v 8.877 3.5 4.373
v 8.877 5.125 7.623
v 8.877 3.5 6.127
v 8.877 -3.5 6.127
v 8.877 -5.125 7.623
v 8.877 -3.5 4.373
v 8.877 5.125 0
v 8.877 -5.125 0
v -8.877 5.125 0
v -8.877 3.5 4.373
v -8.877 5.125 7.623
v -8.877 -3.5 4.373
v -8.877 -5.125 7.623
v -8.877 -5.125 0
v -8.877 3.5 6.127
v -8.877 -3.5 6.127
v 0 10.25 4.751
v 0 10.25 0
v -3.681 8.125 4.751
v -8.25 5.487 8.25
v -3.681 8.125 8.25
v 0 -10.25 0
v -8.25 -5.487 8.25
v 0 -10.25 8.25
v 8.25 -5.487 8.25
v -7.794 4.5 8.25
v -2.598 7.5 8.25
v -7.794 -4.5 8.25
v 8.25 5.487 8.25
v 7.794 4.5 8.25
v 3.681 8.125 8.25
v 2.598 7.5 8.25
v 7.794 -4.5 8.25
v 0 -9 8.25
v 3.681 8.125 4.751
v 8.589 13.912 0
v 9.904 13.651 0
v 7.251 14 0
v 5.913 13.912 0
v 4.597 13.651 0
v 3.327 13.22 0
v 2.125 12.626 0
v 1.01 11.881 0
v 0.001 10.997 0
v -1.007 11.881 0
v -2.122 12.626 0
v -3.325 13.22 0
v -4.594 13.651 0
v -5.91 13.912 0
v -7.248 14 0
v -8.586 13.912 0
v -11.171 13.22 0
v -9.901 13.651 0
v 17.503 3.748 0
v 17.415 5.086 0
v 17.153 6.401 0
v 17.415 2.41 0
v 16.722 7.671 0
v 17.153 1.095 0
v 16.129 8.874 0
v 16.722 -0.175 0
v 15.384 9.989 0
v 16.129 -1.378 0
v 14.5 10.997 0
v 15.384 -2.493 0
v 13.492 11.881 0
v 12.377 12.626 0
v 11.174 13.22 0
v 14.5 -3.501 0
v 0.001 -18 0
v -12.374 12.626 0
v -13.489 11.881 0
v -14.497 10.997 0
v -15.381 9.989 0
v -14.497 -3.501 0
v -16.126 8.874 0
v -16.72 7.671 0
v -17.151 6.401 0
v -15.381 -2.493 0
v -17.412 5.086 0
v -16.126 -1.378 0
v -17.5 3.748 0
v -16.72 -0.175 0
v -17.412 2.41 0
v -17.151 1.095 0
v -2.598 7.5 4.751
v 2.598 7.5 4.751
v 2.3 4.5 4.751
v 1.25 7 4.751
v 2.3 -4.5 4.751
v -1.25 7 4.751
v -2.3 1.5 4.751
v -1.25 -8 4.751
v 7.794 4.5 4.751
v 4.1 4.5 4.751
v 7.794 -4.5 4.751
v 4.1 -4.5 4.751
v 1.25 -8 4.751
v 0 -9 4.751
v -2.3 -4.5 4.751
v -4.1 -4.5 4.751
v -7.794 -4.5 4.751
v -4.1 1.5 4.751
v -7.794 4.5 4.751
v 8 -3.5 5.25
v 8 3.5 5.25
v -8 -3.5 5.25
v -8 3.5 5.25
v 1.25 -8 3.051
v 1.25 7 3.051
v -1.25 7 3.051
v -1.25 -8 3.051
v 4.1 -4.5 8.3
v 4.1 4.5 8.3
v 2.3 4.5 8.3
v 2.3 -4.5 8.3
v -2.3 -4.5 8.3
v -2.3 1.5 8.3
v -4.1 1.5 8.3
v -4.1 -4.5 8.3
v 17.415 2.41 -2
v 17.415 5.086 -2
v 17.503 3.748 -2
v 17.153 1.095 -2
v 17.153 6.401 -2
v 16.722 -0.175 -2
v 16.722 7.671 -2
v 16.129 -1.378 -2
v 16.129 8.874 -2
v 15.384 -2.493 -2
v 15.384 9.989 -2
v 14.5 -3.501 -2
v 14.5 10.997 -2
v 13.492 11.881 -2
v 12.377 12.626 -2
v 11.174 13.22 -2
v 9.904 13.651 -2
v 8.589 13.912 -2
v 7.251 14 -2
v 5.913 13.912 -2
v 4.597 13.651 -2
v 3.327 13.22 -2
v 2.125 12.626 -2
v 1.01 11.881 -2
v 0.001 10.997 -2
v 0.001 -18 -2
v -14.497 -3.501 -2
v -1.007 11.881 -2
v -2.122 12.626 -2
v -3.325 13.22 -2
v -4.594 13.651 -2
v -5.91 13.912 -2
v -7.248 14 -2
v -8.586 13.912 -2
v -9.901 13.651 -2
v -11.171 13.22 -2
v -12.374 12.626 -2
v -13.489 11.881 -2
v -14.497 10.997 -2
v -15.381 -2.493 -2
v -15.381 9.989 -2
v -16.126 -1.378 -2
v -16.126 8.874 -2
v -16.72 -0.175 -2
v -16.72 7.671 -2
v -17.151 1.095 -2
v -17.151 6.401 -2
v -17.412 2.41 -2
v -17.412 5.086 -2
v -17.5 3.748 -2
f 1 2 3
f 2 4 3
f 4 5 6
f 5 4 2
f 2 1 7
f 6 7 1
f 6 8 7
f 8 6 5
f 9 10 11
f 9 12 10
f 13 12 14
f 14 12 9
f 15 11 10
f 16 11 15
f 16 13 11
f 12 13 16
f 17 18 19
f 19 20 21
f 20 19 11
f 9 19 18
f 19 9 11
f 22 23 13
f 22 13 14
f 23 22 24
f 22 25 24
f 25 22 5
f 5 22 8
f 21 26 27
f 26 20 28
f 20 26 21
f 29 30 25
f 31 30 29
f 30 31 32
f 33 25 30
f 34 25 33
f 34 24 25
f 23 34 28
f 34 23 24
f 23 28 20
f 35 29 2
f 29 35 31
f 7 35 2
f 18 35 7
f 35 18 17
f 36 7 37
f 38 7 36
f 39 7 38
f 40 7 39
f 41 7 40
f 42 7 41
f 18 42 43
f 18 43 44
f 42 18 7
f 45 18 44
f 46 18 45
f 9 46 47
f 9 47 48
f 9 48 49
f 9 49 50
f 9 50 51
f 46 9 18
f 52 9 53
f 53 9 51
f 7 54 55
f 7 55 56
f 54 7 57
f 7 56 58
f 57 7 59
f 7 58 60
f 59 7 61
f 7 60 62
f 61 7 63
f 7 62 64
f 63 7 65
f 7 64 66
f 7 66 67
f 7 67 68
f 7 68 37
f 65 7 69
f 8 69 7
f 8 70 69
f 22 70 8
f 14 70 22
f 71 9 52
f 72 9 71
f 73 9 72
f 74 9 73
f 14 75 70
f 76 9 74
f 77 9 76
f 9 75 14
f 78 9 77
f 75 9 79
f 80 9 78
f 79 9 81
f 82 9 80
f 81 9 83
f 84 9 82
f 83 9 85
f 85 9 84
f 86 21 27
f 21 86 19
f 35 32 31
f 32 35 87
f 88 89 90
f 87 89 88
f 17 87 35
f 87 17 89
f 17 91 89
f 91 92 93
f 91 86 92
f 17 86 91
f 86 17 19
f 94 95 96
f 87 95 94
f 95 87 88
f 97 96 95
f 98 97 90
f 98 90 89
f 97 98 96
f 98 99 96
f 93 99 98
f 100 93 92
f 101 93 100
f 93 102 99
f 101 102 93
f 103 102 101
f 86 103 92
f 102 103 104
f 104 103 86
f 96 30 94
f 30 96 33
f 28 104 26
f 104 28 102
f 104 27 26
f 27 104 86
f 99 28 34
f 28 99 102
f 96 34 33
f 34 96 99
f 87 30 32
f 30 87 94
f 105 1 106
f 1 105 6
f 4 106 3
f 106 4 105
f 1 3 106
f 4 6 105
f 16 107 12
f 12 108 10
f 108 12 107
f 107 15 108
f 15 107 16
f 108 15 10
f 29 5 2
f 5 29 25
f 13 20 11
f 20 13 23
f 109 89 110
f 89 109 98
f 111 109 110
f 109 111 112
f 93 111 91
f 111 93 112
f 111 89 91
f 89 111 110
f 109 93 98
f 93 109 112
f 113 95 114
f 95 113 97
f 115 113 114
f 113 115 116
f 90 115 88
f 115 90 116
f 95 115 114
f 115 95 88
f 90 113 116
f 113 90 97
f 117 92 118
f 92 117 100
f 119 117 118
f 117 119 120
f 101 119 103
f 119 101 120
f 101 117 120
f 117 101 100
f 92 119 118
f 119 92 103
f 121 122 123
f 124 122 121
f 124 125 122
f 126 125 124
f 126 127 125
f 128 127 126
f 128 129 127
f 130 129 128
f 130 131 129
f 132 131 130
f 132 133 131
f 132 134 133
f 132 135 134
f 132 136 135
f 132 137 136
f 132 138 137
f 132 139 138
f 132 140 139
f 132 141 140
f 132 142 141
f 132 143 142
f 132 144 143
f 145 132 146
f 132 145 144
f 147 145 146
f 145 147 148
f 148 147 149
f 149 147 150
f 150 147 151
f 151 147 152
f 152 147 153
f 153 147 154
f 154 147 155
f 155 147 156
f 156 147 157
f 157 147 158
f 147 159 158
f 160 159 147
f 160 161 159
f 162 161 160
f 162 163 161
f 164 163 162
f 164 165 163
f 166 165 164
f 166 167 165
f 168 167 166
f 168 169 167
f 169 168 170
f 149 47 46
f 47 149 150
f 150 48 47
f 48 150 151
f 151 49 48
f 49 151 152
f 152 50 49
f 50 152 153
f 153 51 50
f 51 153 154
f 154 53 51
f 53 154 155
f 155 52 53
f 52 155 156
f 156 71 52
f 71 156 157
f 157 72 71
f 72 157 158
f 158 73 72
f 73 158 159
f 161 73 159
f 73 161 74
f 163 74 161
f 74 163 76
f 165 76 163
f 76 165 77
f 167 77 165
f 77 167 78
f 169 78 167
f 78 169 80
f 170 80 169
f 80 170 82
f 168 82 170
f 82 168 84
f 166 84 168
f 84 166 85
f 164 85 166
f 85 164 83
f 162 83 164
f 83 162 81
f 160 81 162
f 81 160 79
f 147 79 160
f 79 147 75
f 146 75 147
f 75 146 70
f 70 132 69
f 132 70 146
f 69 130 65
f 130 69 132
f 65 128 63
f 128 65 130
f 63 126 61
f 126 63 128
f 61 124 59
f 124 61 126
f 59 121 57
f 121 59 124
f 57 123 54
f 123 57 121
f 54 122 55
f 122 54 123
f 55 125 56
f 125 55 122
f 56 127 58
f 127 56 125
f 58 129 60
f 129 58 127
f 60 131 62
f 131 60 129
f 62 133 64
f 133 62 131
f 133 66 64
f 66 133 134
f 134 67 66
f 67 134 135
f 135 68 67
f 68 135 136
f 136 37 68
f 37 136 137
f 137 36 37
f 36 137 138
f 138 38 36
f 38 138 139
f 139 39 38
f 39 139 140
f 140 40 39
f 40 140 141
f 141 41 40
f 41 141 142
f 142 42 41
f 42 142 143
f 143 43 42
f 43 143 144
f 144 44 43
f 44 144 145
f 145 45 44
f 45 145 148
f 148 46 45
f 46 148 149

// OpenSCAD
//
// ktRACK36
//
//



gap1 = 0.001;
gap2 = 0.002;
th = 2;



difference()
{
    union()
    {
        translate([0, 0, 7.5-1]) rotate([0, 0, 90]) cylinder(r=20.5/2, h=3.5, center=true, $fn=6);
        translate([0, 0, 7.5/2]) rotate([0, 0, 90]) cylinder(r=20.5/2, h=7.5, center=true, $fn=6);
        //translate([0, 0, -2/2]) rotate([0, 0, 0]) cylinder(r=36/2, h=2, center=true, $fn=100);
    }
    translate([0, 15, 7.5-1+gap1]) rotate([0, 0, 90]) cylinder(r=18/2, h=3.5, center=true, $fn=6);
    translate([0, 0, 7.5-1+gap1]) rotate([0, 0, 90]) cylinder(r=18/2, h=3.5, center=true, $fn=6);
    translate([8, -7/2, 7.5-2.5/2-1]) rotate([0, 45, 0]) cube([2, 7, 2]);
    translate([-8, 7/2, 7.5-2.5/2-1]) rotate([0, 45, 180]) cube([2, 7, 2]);
    translate([8, -15/2, 8.5]) rotate([0, 45, 0]) cube([2, 15, 2]);
    translate([-8, 15/2, 8.5]) rotate([0, 45, 180]) cube([2, 15, 2]);
    translate([-2.5/2, -8, 7.5-2.5/2-3.2+gap1]) cube([2.5, 15, 2]);
    
    translate([0, -36/2-5, -5+gap1]) rotate([0, 0, 60+90]) cube([30, 30, 5]);
    translate([0, -36/2-5, -5+gap1]) rotate([0, 0, -60]) cube([30, 30, 5]);
    translate([-30/2, 36/2-4, -5+gap1]) rotate([0, 0, 0]) cube([30, 30, 5]);
}

difference()
{
    union()
    {
        translate([3.2-1.8/2, -9/2, 7.5-3.5]) cube([1.8, 9, 4.3]);
        translate([-3.2-1.8/2, -9/2, 7.5-3.5]) cube([1.8, 9, 4.3]);
    }
    //translate([3.2-1.8/2, -3/2+3, 7.5-3.5]) cube([1.8, 3, 4.3]);
    //translate([3.2-1.8/2, -3/2, 7.5-3.5]) cube([1.8, 3, 4.3]);
    //translate([3.2-1.8/2, -3/2-3, 7.5-3.5]) cube([1.8, 3, 4.3]);
    
    translate([-3.2-1.8/2, -3/2+3, 7.5-3.5]) cube([1.8, 3, 4.3]);
    //translate([-3.2-1.8/2, -3/2, 7.5-3.5]) cube([1.8, 3, 4.3]);
    //translate([-3.2-1.8/2, -3/2-3, 7.5-3.5]) cube([1.8, 3, 4.3]);
}



height = 10;
module heart_sub_component(radius) {
    rotated_angle = 45;
    diameter = radius * 2;
    $fn = 48;

    translate([-radius * cos(rotated_angle), 0, 0]) 
        rotate(-rotated_angle) union() {
            circle(radius);
            translate([0, -radius, 0]) 
                square(diameter);
        }
}
module heart(radius, center = false) {
    offsetX = center ? 0 : radius + radius * cos(45);
    offsetY = center ? 1.5 * radius * sin(45) - 0.5 * radius : 3 * radius * sin(45);

    translate([offsetX, offsetY, 0]) union() {
        heart_sub_component(radius);
        mirror([1, 0, 0]) heart_sub_component(radius);
    }

}
translate([-17.5, -36/2, -2]) linear_extrude(height = 2) heart(32 / (3 * sin(45) + 1));
